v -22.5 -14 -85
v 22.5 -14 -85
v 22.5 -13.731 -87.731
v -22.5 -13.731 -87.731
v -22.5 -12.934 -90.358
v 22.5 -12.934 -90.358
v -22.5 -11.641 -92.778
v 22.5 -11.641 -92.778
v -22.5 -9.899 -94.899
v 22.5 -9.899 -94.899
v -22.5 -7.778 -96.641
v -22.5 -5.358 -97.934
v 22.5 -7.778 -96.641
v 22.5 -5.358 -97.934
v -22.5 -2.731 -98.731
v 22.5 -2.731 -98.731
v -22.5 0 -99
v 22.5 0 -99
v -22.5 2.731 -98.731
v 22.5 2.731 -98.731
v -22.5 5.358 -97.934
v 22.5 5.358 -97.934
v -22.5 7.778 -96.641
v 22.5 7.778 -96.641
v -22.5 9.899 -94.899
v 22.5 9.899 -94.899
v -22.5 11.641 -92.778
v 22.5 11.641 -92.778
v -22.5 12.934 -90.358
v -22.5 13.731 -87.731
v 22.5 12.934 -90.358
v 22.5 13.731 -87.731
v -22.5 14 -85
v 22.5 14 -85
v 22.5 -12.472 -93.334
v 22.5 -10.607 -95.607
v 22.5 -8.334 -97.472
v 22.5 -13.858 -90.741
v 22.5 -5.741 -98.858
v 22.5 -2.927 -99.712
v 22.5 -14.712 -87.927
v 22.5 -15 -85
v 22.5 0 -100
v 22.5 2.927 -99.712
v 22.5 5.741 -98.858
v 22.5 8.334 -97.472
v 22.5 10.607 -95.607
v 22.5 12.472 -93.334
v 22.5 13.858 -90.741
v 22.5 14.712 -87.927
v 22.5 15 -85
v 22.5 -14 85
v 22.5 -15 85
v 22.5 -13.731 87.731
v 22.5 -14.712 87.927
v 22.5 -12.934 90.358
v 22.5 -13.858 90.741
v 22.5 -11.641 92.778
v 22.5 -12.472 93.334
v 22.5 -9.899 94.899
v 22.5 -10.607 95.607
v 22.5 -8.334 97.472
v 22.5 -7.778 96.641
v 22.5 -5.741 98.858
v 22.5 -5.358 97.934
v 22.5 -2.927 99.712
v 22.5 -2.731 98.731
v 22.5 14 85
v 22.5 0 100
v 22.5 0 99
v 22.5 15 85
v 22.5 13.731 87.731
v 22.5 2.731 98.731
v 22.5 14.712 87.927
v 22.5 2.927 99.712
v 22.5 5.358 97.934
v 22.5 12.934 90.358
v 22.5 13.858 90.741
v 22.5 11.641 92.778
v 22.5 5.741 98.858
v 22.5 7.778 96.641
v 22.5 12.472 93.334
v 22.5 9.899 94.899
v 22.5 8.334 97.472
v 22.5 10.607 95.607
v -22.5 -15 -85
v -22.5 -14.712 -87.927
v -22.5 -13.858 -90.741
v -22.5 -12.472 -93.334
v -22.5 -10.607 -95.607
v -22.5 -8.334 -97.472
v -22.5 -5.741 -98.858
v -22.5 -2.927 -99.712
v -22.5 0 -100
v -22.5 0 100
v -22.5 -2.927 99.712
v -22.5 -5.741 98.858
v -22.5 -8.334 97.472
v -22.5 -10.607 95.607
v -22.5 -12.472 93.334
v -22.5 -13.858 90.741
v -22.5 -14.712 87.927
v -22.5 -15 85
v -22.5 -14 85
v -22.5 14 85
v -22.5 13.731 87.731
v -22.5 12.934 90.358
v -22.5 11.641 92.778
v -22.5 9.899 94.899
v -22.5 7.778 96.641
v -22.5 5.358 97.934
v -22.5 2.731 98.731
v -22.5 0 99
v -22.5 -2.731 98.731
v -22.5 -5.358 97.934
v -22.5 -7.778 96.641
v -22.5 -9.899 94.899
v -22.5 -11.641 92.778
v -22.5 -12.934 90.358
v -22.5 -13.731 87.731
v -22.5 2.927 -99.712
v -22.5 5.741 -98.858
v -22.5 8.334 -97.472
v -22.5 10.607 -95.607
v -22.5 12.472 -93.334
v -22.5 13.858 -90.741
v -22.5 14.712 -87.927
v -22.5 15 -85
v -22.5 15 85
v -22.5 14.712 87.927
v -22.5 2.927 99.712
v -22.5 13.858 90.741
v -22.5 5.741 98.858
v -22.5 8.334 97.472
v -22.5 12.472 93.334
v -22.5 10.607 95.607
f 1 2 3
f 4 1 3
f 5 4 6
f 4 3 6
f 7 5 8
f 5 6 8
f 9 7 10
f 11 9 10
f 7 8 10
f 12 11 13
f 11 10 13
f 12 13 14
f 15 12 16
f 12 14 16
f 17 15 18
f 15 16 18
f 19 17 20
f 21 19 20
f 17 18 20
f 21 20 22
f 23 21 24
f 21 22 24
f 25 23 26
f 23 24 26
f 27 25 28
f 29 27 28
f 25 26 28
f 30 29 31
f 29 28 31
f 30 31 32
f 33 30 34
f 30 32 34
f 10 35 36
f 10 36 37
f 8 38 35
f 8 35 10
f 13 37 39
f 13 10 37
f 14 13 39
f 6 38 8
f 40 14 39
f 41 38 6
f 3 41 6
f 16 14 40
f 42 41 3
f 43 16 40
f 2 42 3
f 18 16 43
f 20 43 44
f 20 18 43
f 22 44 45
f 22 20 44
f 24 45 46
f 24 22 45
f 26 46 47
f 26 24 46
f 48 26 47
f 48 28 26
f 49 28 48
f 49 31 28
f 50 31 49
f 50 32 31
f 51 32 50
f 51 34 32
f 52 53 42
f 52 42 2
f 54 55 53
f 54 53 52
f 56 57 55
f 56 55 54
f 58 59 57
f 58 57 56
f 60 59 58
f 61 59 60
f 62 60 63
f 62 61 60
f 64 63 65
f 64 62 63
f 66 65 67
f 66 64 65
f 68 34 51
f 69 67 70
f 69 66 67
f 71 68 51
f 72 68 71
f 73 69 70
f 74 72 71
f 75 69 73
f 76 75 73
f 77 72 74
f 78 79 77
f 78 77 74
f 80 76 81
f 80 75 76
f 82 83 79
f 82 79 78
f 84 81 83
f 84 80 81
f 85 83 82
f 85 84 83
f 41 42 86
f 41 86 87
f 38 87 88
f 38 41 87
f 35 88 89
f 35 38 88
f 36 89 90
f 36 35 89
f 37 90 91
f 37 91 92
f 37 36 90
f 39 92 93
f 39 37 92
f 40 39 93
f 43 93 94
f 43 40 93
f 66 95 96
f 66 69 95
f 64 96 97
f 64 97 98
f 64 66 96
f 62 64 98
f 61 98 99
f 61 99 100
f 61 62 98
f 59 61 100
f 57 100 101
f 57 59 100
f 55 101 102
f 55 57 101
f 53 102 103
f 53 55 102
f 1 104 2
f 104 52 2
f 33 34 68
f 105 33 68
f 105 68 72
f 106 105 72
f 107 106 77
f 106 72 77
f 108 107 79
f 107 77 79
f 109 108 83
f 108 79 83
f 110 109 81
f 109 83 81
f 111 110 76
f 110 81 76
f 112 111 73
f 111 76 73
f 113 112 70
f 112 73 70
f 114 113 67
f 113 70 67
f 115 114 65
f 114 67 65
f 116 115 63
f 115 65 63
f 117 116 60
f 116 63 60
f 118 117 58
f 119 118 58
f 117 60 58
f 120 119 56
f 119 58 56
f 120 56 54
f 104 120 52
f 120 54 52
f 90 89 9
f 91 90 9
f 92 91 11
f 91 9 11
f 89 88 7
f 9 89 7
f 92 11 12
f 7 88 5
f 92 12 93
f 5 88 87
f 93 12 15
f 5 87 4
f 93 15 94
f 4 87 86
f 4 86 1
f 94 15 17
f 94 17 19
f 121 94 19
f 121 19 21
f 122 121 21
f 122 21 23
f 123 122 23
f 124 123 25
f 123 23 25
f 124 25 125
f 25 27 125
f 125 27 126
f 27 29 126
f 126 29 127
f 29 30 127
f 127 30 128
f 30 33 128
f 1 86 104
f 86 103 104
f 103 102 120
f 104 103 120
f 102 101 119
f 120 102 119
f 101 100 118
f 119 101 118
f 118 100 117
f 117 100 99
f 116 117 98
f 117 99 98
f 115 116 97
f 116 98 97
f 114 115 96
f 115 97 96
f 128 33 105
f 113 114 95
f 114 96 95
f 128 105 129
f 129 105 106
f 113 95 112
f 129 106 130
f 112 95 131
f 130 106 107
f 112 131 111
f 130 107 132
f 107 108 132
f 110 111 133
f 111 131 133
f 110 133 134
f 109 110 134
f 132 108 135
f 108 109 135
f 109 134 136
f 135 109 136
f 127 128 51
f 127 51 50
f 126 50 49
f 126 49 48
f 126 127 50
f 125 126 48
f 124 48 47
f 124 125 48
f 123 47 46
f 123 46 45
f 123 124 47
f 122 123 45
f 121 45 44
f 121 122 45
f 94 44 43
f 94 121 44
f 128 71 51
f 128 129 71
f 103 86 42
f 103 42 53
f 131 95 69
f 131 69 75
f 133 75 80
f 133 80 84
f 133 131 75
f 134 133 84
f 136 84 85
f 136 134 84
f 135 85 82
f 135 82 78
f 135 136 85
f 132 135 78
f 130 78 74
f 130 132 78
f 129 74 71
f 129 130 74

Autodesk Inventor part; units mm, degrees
ref_plane "YZ Plane" through (0, 0, 0) normal (1, 0, 0) x (0, 1, 0)
ref_plane "XZ Plane" through (0, 0, 0) normal (0, 1, 0) x (-1, 0, 0)
ref_plane "XY Plane" through (0, 0, 0) normal (0, 0, 1) x (1, 0, 0)
sketch "Эскиз1" plane through (0, 0, 0) normal (1, 0, 0) x (0, 1, 0)
  line L0 (-15, 100) -> (15, 100)
  line L1 (15, 100) -> (15, -100)
  line L2 (15, -100) -> (-15, -100)
  line L3 (-15, -100) -> (-15, 100)
  line L4 (-21, 0) -> (21, 0) construction
  line L5 (0, -140) -> (0, 140) construction
  point P0 (0, 0)
  dimension "d0" = 200
  dimension "d1" = 30
extrude "Выдавливание2" add sketch "Эскиз1" along normal mid plane 45
fillet "Сопряжение1" radius 15 4 edges at (0, 15, 100) (0, -15, 100) (0, 15, -100) (0, -15, -100)
sketch "Эскиз2" plane through (22.5, 0, 0) normal (1, 0, 0) x (0, 0, -1)
  arc A0 (85, -15) -> (85, 15) centre (85, 0) ccw construction
  line L0 (85, 15) -> (-85, 15) construction
  arc A1 (-85, 15) -> (-85, -15) centre (-85, 0) ccw construction
  line L1 (-85, -15) -> (85, -15) construction
  line L2 (-99, -14) -> (99, -14)
  line L3 (99, -14) -> (99, 14)
  line L4 (99, 14) -> (-99, 14)
  line L5 (-99, 14) -> (-99, -14)
  arc A2 (-85, 14) -> (-99, 0) centre (-85, 0) ccw
  arc A3 (-85, 15) -> (-85, -15) centre (-85, 0) ccw projected
  arc A4 (-99, 0) -> (-85, -14) centre (-85, 0) ccw
  arc A5 (99, 0) -> (85, 14) centre (85, 0) ccw
  arc A6 (85, -15) -> (85, 15) centre (85, 0) ccw projected
  arc A7 (85, -14) -> (99, 0) centre (85, 0) ccw
  point P0 (0, 0)
  dimension "d11" = 198
  dimension "d12" = 28
  dimension "d13" = 1
  dimension "d14" = 1
extrude "Выдавливание3" cut sketch "Эскиз2" against normal blind 59 contours A4 A2 L4 A5 A7 L2
properties part number "Лента конвейера"
